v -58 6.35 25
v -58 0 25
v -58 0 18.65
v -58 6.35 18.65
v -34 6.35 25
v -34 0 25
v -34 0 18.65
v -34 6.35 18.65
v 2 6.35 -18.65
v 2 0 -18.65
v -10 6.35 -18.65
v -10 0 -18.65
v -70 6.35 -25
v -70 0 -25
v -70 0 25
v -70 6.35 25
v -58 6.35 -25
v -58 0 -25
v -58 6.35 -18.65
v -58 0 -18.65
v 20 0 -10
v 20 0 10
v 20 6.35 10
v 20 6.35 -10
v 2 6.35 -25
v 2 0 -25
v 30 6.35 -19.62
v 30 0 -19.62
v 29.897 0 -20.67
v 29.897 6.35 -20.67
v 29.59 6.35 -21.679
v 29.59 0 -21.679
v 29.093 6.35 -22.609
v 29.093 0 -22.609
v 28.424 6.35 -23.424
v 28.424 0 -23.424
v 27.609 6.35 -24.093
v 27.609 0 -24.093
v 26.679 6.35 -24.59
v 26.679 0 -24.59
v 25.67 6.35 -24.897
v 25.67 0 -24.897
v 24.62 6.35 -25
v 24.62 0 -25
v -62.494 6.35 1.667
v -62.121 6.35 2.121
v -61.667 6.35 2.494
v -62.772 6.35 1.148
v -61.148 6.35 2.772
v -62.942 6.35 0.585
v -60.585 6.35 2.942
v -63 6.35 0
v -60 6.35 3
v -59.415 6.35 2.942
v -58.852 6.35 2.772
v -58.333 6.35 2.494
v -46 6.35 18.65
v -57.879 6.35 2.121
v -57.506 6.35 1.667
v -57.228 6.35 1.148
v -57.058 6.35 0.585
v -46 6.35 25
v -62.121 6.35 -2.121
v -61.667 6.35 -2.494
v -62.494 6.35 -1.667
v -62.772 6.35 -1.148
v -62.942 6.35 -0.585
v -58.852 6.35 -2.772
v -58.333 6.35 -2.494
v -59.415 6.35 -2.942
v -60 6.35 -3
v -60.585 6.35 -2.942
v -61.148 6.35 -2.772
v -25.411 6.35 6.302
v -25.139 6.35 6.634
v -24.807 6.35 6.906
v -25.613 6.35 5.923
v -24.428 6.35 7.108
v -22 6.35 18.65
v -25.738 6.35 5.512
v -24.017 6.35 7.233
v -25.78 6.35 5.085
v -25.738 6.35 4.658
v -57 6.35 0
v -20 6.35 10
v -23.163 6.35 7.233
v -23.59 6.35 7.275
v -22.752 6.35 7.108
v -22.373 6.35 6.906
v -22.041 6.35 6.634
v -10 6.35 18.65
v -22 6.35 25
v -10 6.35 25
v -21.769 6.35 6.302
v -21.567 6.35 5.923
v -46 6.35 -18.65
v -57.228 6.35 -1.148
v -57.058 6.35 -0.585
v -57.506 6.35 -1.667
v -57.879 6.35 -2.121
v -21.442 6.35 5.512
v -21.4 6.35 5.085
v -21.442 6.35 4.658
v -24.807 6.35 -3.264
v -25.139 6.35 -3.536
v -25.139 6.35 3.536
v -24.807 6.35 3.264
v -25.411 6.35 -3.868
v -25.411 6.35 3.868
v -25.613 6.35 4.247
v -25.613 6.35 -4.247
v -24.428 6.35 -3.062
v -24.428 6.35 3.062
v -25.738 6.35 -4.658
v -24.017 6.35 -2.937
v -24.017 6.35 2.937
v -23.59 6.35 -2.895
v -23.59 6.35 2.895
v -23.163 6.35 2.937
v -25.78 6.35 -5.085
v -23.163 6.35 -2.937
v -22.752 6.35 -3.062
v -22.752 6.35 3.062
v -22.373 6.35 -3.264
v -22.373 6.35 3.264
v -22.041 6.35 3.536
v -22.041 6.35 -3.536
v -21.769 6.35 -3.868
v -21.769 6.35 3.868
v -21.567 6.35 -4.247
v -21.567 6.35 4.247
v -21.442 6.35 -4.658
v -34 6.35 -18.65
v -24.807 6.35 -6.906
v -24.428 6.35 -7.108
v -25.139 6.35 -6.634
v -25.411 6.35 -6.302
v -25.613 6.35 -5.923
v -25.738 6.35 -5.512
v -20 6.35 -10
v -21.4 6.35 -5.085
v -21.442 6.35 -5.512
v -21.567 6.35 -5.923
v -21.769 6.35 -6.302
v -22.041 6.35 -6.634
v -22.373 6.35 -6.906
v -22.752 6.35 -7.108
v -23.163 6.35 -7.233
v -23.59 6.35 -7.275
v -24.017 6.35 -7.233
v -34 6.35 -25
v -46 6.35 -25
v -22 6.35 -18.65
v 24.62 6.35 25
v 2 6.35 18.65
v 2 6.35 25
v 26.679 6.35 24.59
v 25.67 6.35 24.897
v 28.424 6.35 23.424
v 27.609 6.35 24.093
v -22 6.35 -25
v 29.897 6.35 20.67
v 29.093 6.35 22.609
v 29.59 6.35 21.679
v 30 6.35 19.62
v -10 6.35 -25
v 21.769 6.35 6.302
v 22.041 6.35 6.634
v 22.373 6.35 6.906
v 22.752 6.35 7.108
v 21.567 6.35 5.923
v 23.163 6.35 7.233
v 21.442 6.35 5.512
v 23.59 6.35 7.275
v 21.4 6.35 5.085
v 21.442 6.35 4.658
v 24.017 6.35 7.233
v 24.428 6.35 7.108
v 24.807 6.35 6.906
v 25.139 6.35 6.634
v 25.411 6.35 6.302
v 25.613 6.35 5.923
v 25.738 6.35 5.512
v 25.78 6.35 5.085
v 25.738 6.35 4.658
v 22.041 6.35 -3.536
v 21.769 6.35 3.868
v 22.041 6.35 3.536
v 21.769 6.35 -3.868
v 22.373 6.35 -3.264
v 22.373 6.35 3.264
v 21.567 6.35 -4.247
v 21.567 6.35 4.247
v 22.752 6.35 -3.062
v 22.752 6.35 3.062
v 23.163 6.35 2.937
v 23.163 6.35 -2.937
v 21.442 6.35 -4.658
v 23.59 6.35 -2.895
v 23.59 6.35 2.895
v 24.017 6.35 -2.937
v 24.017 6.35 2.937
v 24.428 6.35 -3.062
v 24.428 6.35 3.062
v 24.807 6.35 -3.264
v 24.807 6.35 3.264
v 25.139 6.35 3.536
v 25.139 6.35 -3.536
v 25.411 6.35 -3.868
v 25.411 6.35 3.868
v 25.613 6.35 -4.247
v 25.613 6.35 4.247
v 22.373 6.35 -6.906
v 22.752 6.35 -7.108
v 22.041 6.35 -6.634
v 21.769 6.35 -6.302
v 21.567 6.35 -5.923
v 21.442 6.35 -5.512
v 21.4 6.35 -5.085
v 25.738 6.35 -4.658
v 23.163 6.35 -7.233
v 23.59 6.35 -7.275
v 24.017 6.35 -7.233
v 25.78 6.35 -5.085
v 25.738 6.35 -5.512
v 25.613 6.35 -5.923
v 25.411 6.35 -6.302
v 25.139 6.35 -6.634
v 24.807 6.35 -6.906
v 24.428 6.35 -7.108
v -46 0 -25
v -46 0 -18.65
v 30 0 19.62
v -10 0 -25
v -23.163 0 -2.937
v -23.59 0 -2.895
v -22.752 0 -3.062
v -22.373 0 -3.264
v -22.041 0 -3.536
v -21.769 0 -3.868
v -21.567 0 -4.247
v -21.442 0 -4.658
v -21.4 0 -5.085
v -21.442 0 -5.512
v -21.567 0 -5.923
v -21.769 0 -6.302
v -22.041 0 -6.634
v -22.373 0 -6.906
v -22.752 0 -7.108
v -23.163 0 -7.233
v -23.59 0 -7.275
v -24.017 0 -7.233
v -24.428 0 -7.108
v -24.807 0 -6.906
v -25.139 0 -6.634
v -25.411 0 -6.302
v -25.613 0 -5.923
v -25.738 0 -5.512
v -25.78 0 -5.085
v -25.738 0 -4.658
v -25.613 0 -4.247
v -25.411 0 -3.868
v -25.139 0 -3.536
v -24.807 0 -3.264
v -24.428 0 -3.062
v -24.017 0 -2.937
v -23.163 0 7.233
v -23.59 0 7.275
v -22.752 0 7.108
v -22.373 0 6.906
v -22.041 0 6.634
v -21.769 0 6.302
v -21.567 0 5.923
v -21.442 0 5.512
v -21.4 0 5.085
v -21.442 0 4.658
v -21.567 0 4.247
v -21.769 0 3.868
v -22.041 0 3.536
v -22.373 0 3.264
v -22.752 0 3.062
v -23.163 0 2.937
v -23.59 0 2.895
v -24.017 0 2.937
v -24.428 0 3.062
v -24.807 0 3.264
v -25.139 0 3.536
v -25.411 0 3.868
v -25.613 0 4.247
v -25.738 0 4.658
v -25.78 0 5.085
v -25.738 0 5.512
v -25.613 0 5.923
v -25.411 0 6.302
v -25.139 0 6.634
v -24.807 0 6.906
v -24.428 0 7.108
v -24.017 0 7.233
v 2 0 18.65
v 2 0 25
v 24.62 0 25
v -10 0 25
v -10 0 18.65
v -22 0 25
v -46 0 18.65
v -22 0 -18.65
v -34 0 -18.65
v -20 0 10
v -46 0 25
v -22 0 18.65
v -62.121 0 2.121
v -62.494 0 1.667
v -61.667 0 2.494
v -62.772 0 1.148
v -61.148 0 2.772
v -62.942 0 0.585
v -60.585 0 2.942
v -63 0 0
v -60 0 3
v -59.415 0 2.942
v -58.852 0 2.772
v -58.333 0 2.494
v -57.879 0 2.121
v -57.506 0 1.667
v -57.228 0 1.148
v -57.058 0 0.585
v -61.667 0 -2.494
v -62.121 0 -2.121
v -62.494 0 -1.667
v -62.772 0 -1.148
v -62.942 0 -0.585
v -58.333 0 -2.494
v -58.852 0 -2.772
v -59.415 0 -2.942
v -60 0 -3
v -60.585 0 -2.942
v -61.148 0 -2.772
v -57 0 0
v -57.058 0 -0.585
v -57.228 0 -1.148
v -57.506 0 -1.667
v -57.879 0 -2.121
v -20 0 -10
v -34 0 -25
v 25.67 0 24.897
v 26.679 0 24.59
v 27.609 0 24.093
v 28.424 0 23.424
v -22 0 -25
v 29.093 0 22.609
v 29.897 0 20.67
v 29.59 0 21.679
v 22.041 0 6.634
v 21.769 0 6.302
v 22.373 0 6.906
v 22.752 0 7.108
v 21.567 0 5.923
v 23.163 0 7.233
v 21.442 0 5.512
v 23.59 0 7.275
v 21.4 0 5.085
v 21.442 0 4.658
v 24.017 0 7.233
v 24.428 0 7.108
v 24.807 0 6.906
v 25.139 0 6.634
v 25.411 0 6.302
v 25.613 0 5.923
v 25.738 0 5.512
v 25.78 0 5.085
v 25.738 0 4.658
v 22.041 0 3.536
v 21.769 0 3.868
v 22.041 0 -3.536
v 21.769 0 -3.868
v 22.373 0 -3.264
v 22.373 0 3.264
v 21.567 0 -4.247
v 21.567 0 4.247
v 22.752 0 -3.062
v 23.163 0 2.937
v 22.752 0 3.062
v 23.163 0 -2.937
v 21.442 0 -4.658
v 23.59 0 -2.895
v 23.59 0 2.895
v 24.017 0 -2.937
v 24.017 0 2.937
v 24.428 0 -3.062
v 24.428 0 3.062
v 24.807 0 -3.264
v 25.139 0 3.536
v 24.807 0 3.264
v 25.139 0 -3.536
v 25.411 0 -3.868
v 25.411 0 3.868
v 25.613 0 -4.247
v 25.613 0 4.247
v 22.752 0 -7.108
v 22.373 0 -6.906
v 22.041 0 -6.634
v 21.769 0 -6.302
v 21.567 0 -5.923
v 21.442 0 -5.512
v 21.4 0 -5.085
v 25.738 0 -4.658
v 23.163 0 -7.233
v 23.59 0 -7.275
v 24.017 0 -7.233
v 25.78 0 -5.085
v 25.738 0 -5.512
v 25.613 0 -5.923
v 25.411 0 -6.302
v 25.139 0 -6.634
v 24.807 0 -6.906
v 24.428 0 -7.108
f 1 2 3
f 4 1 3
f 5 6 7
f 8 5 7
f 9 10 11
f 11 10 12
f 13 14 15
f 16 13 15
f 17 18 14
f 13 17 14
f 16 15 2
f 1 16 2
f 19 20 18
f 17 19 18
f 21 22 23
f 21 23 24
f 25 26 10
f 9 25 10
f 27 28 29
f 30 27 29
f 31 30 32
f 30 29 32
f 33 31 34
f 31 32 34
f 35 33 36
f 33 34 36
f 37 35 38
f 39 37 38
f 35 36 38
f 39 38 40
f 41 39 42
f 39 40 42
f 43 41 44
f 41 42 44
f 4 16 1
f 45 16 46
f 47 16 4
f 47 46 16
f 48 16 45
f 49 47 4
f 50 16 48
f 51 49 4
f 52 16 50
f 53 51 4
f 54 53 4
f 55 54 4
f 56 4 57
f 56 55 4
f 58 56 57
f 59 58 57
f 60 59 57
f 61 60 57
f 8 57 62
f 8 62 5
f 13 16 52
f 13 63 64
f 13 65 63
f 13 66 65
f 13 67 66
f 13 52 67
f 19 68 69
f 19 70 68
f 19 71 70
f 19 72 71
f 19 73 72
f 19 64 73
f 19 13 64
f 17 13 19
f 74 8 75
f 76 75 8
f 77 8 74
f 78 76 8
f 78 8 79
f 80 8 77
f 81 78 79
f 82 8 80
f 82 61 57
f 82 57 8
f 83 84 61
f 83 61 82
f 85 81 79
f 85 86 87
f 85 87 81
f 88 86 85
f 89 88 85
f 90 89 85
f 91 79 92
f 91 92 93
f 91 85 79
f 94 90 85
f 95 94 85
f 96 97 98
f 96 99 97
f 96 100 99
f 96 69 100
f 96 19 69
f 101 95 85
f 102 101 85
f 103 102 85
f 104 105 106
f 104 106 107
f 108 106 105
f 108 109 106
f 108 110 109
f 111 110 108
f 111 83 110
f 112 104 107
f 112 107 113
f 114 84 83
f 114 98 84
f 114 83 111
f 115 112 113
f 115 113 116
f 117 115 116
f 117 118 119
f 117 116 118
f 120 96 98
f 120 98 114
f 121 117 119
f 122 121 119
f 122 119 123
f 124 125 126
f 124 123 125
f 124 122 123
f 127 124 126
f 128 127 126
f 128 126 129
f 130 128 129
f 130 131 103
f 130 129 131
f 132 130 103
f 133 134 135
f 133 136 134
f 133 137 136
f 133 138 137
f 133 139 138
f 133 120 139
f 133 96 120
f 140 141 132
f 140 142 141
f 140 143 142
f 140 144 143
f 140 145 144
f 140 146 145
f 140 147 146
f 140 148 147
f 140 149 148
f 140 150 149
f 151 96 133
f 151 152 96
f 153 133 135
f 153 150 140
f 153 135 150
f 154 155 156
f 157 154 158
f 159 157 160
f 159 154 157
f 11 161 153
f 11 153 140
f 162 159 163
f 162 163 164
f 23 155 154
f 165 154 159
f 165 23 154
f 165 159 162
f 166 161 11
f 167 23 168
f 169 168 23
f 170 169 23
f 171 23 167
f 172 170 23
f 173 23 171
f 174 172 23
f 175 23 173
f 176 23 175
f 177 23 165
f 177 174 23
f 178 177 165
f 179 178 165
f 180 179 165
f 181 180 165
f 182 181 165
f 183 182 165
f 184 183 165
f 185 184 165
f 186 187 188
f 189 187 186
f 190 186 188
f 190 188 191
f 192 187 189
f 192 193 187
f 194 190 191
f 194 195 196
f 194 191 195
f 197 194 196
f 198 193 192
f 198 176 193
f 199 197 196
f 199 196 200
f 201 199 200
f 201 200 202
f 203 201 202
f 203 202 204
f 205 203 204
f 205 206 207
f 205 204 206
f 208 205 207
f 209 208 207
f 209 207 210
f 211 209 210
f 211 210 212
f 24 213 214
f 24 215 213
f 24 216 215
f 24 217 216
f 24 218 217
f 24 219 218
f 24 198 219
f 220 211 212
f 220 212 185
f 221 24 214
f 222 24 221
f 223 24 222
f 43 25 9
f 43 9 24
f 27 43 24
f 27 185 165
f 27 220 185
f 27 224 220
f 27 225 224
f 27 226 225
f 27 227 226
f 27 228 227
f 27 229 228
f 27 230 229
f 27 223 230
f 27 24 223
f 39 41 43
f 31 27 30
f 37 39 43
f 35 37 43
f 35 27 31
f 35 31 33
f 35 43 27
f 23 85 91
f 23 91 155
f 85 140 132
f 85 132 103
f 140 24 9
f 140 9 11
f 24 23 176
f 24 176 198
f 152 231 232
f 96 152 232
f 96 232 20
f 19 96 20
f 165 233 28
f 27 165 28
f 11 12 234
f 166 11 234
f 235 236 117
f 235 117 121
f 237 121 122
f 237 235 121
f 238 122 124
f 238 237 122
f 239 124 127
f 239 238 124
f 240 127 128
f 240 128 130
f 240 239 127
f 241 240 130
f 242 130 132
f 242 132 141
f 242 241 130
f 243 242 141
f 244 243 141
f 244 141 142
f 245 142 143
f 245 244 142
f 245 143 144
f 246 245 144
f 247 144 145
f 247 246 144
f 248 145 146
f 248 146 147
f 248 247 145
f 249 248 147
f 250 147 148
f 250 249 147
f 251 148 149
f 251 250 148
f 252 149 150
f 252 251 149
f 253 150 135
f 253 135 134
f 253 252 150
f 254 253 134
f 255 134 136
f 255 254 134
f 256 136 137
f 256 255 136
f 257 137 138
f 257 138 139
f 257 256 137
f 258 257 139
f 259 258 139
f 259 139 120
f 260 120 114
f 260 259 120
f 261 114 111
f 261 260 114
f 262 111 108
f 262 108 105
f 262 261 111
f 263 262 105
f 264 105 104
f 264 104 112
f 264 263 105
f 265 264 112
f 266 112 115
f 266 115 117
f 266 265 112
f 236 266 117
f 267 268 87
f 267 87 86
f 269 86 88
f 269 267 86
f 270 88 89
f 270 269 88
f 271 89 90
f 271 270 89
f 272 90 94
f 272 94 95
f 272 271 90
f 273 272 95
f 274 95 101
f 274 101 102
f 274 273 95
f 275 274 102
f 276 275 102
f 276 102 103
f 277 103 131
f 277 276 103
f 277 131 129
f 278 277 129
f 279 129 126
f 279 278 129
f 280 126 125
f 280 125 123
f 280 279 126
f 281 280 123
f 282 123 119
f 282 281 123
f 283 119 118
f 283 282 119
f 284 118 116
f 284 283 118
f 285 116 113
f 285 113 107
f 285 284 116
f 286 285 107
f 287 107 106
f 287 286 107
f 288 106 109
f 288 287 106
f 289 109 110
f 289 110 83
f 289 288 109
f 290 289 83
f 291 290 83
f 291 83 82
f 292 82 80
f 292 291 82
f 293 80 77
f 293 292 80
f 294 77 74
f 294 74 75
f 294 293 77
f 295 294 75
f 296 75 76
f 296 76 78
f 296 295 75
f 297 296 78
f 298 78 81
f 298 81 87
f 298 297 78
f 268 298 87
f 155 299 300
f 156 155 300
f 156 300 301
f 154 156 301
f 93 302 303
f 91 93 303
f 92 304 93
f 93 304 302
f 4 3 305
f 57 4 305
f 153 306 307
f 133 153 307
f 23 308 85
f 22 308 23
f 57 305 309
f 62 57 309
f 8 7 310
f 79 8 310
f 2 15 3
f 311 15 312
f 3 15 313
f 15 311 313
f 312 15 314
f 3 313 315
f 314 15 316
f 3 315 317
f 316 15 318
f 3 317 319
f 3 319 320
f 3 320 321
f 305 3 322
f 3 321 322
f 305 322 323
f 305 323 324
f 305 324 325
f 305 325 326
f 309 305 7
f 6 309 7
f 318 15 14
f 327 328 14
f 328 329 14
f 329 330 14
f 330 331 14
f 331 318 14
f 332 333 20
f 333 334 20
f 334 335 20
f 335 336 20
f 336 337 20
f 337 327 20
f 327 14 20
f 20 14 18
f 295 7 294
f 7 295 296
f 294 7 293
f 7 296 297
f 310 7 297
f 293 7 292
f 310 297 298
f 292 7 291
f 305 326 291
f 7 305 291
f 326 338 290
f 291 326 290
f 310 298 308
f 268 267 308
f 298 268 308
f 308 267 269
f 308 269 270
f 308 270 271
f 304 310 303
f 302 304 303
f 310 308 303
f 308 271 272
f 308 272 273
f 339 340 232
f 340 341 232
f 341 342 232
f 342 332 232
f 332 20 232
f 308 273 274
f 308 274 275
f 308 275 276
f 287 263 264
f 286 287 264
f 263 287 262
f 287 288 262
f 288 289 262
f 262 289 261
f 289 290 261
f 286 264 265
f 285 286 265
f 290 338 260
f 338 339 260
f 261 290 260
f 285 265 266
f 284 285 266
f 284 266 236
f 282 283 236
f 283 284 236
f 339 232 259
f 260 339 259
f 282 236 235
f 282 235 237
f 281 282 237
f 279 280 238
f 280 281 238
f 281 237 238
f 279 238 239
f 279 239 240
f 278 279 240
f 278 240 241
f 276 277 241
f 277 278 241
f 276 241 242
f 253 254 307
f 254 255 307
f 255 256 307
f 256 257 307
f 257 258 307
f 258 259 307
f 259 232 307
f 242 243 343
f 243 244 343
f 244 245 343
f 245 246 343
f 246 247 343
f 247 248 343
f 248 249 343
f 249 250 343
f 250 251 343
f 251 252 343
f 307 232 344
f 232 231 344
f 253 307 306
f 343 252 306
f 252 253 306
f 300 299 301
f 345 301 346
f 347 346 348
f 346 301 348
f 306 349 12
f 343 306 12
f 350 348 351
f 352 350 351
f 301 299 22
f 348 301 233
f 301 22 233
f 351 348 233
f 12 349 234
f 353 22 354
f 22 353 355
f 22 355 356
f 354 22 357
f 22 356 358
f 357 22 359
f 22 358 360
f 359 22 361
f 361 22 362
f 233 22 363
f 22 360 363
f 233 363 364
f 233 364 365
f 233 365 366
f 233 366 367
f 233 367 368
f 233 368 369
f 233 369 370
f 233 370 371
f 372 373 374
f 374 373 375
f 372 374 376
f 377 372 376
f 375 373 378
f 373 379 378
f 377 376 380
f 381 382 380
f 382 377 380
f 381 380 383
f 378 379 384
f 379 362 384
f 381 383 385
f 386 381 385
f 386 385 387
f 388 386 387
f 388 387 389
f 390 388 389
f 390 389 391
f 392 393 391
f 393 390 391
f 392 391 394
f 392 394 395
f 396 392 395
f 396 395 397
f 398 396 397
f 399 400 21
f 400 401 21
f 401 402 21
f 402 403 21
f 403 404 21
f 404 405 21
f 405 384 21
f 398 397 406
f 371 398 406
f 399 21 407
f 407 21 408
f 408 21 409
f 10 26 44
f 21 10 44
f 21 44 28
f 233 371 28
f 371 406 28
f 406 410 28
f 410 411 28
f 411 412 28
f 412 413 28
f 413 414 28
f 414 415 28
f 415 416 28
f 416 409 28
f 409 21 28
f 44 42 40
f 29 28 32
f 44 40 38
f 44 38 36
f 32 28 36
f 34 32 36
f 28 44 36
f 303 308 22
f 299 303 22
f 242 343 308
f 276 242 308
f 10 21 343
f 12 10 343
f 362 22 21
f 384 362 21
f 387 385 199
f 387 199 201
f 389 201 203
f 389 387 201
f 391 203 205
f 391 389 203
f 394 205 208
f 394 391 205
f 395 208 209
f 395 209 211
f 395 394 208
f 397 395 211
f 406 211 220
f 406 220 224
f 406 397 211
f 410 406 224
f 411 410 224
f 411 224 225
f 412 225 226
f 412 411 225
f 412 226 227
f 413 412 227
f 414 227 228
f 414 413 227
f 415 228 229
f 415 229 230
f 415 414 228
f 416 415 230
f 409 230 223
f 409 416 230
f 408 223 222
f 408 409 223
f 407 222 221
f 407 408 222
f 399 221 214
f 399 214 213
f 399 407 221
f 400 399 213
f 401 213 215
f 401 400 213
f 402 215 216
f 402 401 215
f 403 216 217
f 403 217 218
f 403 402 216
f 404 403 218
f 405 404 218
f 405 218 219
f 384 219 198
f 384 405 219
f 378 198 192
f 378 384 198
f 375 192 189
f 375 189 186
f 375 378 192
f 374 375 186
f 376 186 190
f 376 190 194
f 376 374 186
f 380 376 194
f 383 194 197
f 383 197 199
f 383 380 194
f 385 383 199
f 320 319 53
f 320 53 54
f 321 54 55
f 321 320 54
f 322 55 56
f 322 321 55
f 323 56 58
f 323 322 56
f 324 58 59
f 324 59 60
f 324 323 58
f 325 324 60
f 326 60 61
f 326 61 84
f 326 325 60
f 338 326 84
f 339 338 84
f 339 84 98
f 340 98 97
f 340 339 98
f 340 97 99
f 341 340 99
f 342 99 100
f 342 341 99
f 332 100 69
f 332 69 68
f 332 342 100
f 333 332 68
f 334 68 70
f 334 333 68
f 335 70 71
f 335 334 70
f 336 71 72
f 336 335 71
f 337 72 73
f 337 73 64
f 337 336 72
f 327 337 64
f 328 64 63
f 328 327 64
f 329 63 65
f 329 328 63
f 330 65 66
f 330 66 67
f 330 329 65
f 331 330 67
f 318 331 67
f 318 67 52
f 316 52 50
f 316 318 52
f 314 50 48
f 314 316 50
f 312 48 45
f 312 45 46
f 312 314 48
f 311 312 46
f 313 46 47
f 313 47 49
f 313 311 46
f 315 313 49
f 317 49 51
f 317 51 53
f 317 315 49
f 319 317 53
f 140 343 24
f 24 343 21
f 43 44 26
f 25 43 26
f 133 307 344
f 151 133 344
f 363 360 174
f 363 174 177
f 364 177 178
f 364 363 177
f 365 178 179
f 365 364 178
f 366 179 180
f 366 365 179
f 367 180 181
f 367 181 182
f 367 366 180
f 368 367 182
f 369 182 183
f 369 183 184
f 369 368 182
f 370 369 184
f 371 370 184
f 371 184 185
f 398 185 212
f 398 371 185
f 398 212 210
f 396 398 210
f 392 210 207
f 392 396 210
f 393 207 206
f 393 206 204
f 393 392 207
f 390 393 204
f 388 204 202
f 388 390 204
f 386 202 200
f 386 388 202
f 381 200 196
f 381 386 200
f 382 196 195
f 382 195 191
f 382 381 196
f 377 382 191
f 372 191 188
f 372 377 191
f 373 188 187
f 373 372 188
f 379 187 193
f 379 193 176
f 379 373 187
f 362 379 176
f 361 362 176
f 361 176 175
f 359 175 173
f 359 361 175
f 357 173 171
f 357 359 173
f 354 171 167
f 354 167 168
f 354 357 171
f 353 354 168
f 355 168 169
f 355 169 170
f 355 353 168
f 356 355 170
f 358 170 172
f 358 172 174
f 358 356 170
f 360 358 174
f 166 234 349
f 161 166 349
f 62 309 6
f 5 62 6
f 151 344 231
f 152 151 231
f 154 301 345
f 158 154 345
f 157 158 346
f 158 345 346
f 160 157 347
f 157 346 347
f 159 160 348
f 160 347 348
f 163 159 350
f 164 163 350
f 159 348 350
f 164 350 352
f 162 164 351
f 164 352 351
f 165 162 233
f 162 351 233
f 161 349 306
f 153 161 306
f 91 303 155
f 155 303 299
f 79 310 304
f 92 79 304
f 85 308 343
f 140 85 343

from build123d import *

# Parameters (mm, degrees)
SKETCH2_R           = 2.19
SKETCH2_R_2         = 3
SKETCH2_W           = 40
SKETCH2_H           = 20
BOSS_EXTRUDE2_DEPTH = 6.35


with BuildPart() as part:
    # Sketch2 → Boss-Extrude2 (new body)
    with BuildSketch(Plane(origin=(0, 0, 0), x_dir=(1, 0, 0), z_dir=(0, 1, 0))):
        with BuildLine():
            Line((-70, 25), (-70, -25))
            Line((-70, -25), (-58, -25))
            Line((-58, -25), (-58, -18.65))
            Line((-58, -18.65), (-46, -18.65))
            Line((-46, -18.65), (-46, -25))
            Line((-46, -25), (-34, -25))
            Line((-34, -25), (-34, -18.65))
            Line((-34, -18.65), (-22, -18.65))
            Line((-22, -18.65), (-22, -25))
            Line((-22, -25), (-10, -25))
            Line((-10, -25), (-10, -18.65))
            Line((-10, -18.65), (2, -18.65))
            Line((2, -18.65), (2, -25))
            Line((2, -25), (24.62, -25))
            ThreePointArc((24.62, -25), (28.424234483, -23.424234483), (30, -19.62))
            Line((30, -19.62), (30, 19.62))
            ThreePointArc((30, 19.62), (28.424234483, 23.424234483), (24.62, 25))
            Line((24.62, 25), (2, 25))
            Line((2, 25), (2, 18.65))
            Line((2, 18.65), (-10, 18.65))
            Line((-10, 18.65), (-10, 25))
            Line((-10, 25), (-22, 25))
            Line((-22, 25), (-22, 18.65))
            Line((-22, 18.65), (-34, 18.65))
            Line((-34, 18.65), (-34, 25))
            Line((-34, 25), (-46, 25))
            Line((-46, 25), (-46, 18.65))
            Line((-46, 18.65), (-58, 18.65))
            Line((-58, 18.65), (-58, 25))
            Line((-58, 25), (-70, 25))
        make_face()
        with Locations(Location((23.59, 5.085, 0), (0, 0, 270))):
            Circle(SKETCH2_R, mode=Mode.SUBTRACT)
        with Locations(Location((23.59, -5.085, 0), (0, 0, 270))):
            Circle(SKETCH2_R, mode=Mode.SUBTRACT)
        with Locations(Location((-23.59, 5.085, 0), (0, 0, 270))):
            Circle(SKETCH2_R, mode=Mode.SUBTRACT)
        with Locations(Location((-23.59, -5.085, 0), (0, 0, 270))):
            Circle(SKETCH2_R, mode=Mode.SUBTRACT)
        with Locations(Location((-60, 0, 0), (0, 0, 270))):
            Circle(SKETCH2_R_2, mode=Mode.SUBTRACT)
        Rectangle(SKETCH2_W, SKETCH2_H, mode=Mode.SUBTRACT)
    extrude(amount=BOSS_EXTRUDE2_DEPTH)


solid = part.part
